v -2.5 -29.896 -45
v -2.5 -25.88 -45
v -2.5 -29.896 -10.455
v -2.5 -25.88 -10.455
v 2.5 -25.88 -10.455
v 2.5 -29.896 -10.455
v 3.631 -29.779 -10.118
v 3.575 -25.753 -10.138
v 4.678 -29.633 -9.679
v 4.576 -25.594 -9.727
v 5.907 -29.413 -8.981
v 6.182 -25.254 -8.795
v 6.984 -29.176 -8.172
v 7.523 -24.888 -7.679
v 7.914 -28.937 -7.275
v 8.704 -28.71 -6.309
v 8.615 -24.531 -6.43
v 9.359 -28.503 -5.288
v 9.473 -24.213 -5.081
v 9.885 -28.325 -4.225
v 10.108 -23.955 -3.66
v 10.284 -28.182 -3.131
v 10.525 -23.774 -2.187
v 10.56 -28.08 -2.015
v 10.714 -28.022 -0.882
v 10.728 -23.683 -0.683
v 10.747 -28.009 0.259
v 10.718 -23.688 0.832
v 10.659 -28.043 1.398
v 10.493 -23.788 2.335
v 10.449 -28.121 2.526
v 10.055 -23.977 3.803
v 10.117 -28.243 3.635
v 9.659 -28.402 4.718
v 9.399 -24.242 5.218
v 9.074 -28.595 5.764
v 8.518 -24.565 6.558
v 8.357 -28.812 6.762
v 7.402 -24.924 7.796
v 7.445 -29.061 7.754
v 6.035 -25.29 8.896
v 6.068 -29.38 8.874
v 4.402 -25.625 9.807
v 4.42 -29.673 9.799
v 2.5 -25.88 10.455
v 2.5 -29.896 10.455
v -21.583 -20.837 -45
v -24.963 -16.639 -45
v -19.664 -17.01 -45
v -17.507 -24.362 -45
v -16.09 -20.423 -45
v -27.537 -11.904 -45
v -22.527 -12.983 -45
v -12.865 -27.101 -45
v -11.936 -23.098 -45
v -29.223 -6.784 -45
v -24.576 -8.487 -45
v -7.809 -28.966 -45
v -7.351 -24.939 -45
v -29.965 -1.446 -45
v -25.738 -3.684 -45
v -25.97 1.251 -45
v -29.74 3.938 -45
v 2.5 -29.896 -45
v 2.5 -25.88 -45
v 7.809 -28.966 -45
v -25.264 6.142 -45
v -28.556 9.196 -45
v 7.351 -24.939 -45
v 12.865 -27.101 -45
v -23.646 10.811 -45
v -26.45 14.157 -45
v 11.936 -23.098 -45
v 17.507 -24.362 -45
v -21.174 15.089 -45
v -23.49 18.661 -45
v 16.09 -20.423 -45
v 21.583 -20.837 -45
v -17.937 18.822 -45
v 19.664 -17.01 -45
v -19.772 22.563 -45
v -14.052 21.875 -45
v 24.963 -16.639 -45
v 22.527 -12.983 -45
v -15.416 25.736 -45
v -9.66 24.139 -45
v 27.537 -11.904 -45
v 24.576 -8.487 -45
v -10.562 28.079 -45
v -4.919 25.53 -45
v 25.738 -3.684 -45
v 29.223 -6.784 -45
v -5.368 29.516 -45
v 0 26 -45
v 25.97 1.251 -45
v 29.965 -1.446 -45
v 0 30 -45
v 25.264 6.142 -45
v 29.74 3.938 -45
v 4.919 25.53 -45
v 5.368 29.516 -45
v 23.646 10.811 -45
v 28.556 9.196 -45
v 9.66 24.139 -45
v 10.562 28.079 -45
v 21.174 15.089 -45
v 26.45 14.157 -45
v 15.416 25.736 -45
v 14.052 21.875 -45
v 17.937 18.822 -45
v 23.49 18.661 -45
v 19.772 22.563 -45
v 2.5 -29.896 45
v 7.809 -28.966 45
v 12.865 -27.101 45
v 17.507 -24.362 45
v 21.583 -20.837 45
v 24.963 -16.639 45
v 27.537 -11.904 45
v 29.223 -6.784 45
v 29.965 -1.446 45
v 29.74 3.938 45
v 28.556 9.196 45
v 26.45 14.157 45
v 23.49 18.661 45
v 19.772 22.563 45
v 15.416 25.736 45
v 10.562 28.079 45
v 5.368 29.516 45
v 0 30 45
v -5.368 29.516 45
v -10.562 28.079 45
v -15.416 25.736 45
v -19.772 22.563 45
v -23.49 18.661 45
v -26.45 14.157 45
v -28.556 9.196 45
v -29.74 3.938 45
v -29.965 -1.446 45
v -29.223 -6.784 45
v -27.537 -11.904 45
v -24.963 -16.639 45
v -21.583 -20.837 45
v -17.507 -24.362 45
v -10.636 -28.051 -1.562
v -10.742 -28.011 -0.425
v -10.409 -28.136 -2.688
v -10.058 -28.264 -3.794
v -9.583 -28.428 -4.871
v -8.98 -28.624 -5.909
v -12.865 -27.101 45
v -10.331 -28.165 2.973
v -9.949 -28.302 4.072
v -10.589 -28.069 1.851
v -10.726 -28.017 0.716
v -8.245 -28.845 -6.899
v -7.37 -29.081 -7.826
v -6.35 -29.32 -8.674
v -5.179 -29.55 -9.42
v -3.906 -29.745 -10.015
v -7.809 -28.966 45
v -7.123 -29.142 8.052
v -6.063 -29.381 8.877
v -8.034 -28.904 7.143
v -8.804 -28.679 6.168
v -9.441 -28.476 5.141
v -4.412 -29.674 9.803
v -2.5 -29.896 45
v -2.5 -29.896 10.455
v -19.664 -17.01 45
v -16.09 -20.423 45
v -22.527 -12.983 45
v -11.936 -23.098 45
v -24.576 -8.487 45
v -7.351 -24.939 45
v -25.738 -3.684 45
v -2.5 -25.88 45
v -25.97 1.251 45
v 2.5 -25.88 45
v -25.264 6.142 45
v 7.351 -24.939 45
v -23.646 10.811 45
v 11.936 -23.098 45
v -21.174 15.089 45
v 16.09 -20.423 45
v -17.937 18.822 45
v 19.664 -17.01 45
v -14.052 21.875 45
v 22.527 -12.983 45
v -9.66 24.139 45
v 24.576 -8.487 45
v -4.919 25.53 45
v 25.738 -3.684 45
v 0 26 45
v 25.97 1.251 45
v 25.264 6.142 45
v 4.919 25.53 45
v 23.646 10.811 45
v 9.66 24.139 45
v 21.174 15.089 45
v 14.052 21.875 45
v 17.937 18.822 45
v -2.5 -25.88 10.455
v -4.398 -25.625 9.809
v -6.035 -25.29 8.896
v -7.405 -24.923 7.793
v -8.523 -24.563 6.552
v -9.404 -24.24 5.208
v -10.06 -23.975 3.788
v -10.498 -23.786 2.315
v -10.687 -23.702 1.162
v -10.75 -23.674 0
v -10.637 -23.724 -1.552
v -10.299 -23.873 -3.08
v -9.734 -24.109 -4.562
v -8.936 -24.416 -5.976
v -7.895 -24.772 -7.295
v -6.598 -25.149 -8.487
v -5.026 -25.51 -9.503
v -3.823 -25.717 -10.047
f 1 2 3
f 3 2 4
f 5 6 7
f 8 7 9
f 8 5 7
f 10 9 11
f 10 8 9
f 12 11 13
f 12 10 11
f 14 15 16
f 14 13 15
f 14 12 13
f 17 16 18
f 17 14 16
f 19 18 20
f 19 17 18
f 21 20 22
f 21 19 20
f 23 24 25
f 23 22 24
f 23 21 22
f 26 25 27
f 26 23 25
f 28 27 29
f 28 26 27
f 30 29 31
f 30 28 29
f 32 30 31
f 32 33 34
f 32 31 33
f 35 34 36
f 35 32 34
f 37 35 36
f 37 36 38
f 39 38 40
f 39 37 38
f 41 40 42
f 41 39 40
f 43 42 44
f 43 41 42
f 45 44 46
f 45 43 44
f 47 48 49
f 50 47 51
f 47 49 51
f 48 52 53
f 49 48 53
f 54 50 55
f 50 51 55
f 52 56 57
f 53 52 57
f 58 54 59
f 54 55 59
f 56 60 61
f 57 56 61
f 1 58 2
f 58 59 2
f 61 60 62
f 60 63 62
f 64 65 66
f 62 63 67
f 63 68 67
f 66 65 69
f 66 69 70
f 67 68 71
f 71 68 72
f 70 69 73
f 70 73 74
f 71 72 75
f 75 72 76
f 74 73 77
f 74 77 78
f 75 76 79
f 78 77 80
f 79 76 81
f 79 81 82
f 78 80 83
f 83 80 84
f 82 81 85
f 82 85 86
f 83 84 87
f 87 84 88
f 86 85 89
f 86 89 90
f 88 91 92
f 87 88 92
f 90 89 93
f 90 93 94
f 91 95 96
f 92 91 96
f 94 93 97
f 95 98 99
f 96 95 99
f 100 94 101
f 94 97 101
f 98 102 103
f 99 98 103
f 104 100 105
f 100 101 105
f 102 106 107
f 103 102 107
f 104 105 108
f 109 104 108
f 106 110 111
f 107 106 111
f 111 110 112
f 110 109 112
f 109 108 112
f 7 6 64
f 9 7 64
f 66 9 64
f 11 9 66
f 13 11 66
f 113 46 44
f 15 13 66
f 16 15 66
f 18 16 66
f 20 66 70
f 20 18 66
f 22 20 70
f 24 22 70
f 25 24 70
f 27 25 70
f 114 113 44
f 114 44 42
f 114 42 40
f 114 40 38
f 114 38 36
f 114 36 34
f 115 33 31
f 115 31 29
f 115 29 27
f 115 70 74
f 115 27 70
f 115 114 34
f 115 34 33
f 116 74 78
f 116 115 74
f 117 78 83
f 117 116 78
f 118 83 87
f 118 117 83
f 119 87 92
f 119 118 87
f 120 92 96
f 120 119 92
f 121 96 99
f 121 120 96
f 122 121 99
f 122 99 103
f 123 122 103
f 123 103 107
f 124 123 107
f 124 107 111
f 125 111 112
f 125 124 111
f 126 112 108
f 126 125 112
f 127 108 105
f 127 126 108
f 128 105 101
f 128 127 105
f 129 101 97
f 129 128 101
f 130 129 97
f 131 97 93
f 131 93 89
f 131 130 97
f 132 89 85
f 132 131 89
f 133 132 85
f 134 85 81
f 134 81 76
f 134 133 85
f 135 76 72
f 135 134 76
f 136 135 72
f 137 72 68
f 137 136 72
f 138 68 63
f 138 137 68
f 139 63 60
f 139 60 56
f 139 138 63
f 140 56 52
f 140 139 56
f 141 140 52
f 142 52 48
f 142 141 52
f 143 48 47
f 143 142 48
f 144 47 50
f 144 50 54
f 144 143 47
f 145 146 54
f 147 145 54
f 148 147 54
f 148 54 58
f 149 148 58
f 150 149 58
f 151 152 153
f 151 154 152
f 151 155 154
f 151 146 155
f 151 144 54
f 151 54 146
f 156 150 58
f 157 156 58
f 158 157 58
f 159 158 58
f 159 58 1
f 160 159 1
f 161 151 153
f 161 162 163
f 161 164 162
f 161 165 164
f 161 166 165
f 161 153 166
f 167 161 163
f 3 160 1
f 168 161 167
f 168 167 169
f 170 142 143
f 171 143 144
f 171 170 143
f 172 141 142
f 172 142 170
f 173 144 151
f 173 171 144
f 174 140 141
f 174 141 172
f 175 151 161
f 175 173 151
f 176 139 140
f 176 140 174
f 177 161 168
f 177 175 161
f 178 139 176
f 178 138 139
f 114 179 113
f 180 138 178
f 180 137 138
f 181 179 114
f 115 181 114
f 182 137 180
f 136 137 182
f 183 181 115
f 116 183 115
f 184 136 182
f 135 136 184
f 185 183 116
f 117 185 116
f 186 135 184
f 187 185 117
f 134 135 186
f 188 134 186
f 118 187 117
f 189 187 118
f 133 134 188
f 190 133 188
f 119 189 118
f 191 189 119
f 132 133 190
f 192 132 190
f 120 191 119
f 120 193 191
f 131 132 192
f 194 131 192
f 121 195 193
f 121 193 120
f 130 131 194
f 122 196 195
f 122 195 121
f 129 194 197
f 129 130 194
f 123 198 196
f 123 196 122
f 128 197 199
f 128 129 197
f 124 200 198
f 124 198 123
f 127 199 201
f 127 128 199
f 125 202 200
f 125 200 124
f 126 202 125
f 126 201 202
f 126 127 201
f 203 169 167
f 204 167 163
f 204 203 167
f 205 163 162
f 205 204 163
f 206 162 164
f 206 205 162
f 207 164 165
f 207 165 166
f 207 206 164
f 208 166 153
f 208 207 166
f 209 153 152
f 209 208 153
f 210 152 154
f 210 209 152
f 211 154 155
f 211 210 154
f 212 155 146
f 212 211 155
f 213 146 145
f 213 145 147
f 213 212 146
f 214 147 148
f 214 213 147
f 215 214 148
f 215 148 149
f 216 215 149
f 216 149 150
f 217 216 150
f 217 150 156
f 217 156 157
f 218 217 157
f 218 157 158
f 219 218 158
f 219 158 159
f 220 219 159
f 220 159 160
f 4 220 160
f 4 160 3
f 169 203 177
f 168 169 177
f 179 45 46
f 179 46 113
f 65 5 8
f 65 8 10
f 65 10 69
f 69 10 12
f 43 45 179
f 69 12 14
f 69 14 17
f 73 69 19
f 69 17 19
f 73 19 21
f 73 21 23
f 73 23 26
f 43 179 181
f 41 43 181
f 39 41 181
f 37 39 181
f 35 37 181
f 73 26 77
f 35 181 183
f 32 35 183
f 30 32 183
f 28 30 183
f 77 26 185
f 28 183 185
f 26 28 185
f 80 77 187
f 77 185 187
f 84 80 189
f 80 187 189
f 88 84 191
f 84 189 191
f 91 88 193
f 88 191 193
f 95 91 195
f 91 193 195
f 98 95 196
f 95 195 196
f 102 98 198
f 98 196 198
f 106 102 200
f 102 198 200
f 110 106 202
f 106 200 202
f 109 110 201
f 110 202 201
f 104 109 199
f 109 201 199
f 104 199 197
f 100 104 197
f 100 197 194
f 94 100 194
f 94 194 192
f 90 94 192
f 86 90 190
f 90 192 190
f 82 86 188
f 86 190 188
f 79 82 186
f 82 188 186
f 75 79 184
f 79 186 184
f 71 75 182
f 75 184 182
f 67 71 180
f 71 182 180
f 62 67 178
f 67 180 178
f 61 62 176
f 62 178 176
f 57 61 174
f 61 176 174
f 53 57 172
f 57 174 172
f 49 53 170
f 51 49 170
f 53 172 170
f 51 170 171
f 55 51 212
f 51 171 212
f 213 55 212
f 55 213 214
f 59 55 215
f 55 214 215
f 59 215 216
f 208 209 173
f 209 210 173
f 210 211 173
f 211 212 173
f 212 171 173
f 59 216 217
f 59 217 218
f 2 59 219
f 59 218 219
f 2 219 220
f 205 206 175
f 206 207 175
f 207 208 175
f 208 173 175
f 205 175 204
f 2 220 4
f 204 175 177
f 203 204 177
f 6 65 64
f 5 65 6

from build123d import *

# Parameters (mm, degrees)
SKETCH009_R       = 30
SKETCH009_R_2     = 26
PAD002_DEPTH      = 45
PAD002_DEPTH_BACK = 45
SKETCH010_R       = 10.75
POCKET007_DEPTH   = 30.001
SKETCH027_W       = 5
SKETCH027_H       = 90
POCKET012_DEPTH   = 30.001


with BuildPart() as part:
    # Sketch009 → Pad002 (new body, two sides)
    with BuildSketch(Plane.XY) as pad002_sk:
        Circle(SKETCH009_R)
        Circle(SKETCH009_R_2, mode=Mode.SUBTRACT)
    extrude(amount=PAD002_DEPTH)
    extrude(pad002_sk.sketch, amount=-PAD002_DEPTH_BACK)

    # Sketch010 → Pocket007 (cut, through all)
    with BuildSketch(Plane.XZ):
        Circle(SKETCH010_R)
    extrude(amount=POCKET007_DEPTH, mode=Mode.SUBTRACT)

    # Sketch027 → Pocket012 (cut, through all)
    with BuildSketch(Plane.XZ):
        Rectangle(SKETCH027_W, SKETCH027_H)
    extrude(amount=POCKET012_DEPTH, mode=Mode.SUBTRACT)


solid = part.part
